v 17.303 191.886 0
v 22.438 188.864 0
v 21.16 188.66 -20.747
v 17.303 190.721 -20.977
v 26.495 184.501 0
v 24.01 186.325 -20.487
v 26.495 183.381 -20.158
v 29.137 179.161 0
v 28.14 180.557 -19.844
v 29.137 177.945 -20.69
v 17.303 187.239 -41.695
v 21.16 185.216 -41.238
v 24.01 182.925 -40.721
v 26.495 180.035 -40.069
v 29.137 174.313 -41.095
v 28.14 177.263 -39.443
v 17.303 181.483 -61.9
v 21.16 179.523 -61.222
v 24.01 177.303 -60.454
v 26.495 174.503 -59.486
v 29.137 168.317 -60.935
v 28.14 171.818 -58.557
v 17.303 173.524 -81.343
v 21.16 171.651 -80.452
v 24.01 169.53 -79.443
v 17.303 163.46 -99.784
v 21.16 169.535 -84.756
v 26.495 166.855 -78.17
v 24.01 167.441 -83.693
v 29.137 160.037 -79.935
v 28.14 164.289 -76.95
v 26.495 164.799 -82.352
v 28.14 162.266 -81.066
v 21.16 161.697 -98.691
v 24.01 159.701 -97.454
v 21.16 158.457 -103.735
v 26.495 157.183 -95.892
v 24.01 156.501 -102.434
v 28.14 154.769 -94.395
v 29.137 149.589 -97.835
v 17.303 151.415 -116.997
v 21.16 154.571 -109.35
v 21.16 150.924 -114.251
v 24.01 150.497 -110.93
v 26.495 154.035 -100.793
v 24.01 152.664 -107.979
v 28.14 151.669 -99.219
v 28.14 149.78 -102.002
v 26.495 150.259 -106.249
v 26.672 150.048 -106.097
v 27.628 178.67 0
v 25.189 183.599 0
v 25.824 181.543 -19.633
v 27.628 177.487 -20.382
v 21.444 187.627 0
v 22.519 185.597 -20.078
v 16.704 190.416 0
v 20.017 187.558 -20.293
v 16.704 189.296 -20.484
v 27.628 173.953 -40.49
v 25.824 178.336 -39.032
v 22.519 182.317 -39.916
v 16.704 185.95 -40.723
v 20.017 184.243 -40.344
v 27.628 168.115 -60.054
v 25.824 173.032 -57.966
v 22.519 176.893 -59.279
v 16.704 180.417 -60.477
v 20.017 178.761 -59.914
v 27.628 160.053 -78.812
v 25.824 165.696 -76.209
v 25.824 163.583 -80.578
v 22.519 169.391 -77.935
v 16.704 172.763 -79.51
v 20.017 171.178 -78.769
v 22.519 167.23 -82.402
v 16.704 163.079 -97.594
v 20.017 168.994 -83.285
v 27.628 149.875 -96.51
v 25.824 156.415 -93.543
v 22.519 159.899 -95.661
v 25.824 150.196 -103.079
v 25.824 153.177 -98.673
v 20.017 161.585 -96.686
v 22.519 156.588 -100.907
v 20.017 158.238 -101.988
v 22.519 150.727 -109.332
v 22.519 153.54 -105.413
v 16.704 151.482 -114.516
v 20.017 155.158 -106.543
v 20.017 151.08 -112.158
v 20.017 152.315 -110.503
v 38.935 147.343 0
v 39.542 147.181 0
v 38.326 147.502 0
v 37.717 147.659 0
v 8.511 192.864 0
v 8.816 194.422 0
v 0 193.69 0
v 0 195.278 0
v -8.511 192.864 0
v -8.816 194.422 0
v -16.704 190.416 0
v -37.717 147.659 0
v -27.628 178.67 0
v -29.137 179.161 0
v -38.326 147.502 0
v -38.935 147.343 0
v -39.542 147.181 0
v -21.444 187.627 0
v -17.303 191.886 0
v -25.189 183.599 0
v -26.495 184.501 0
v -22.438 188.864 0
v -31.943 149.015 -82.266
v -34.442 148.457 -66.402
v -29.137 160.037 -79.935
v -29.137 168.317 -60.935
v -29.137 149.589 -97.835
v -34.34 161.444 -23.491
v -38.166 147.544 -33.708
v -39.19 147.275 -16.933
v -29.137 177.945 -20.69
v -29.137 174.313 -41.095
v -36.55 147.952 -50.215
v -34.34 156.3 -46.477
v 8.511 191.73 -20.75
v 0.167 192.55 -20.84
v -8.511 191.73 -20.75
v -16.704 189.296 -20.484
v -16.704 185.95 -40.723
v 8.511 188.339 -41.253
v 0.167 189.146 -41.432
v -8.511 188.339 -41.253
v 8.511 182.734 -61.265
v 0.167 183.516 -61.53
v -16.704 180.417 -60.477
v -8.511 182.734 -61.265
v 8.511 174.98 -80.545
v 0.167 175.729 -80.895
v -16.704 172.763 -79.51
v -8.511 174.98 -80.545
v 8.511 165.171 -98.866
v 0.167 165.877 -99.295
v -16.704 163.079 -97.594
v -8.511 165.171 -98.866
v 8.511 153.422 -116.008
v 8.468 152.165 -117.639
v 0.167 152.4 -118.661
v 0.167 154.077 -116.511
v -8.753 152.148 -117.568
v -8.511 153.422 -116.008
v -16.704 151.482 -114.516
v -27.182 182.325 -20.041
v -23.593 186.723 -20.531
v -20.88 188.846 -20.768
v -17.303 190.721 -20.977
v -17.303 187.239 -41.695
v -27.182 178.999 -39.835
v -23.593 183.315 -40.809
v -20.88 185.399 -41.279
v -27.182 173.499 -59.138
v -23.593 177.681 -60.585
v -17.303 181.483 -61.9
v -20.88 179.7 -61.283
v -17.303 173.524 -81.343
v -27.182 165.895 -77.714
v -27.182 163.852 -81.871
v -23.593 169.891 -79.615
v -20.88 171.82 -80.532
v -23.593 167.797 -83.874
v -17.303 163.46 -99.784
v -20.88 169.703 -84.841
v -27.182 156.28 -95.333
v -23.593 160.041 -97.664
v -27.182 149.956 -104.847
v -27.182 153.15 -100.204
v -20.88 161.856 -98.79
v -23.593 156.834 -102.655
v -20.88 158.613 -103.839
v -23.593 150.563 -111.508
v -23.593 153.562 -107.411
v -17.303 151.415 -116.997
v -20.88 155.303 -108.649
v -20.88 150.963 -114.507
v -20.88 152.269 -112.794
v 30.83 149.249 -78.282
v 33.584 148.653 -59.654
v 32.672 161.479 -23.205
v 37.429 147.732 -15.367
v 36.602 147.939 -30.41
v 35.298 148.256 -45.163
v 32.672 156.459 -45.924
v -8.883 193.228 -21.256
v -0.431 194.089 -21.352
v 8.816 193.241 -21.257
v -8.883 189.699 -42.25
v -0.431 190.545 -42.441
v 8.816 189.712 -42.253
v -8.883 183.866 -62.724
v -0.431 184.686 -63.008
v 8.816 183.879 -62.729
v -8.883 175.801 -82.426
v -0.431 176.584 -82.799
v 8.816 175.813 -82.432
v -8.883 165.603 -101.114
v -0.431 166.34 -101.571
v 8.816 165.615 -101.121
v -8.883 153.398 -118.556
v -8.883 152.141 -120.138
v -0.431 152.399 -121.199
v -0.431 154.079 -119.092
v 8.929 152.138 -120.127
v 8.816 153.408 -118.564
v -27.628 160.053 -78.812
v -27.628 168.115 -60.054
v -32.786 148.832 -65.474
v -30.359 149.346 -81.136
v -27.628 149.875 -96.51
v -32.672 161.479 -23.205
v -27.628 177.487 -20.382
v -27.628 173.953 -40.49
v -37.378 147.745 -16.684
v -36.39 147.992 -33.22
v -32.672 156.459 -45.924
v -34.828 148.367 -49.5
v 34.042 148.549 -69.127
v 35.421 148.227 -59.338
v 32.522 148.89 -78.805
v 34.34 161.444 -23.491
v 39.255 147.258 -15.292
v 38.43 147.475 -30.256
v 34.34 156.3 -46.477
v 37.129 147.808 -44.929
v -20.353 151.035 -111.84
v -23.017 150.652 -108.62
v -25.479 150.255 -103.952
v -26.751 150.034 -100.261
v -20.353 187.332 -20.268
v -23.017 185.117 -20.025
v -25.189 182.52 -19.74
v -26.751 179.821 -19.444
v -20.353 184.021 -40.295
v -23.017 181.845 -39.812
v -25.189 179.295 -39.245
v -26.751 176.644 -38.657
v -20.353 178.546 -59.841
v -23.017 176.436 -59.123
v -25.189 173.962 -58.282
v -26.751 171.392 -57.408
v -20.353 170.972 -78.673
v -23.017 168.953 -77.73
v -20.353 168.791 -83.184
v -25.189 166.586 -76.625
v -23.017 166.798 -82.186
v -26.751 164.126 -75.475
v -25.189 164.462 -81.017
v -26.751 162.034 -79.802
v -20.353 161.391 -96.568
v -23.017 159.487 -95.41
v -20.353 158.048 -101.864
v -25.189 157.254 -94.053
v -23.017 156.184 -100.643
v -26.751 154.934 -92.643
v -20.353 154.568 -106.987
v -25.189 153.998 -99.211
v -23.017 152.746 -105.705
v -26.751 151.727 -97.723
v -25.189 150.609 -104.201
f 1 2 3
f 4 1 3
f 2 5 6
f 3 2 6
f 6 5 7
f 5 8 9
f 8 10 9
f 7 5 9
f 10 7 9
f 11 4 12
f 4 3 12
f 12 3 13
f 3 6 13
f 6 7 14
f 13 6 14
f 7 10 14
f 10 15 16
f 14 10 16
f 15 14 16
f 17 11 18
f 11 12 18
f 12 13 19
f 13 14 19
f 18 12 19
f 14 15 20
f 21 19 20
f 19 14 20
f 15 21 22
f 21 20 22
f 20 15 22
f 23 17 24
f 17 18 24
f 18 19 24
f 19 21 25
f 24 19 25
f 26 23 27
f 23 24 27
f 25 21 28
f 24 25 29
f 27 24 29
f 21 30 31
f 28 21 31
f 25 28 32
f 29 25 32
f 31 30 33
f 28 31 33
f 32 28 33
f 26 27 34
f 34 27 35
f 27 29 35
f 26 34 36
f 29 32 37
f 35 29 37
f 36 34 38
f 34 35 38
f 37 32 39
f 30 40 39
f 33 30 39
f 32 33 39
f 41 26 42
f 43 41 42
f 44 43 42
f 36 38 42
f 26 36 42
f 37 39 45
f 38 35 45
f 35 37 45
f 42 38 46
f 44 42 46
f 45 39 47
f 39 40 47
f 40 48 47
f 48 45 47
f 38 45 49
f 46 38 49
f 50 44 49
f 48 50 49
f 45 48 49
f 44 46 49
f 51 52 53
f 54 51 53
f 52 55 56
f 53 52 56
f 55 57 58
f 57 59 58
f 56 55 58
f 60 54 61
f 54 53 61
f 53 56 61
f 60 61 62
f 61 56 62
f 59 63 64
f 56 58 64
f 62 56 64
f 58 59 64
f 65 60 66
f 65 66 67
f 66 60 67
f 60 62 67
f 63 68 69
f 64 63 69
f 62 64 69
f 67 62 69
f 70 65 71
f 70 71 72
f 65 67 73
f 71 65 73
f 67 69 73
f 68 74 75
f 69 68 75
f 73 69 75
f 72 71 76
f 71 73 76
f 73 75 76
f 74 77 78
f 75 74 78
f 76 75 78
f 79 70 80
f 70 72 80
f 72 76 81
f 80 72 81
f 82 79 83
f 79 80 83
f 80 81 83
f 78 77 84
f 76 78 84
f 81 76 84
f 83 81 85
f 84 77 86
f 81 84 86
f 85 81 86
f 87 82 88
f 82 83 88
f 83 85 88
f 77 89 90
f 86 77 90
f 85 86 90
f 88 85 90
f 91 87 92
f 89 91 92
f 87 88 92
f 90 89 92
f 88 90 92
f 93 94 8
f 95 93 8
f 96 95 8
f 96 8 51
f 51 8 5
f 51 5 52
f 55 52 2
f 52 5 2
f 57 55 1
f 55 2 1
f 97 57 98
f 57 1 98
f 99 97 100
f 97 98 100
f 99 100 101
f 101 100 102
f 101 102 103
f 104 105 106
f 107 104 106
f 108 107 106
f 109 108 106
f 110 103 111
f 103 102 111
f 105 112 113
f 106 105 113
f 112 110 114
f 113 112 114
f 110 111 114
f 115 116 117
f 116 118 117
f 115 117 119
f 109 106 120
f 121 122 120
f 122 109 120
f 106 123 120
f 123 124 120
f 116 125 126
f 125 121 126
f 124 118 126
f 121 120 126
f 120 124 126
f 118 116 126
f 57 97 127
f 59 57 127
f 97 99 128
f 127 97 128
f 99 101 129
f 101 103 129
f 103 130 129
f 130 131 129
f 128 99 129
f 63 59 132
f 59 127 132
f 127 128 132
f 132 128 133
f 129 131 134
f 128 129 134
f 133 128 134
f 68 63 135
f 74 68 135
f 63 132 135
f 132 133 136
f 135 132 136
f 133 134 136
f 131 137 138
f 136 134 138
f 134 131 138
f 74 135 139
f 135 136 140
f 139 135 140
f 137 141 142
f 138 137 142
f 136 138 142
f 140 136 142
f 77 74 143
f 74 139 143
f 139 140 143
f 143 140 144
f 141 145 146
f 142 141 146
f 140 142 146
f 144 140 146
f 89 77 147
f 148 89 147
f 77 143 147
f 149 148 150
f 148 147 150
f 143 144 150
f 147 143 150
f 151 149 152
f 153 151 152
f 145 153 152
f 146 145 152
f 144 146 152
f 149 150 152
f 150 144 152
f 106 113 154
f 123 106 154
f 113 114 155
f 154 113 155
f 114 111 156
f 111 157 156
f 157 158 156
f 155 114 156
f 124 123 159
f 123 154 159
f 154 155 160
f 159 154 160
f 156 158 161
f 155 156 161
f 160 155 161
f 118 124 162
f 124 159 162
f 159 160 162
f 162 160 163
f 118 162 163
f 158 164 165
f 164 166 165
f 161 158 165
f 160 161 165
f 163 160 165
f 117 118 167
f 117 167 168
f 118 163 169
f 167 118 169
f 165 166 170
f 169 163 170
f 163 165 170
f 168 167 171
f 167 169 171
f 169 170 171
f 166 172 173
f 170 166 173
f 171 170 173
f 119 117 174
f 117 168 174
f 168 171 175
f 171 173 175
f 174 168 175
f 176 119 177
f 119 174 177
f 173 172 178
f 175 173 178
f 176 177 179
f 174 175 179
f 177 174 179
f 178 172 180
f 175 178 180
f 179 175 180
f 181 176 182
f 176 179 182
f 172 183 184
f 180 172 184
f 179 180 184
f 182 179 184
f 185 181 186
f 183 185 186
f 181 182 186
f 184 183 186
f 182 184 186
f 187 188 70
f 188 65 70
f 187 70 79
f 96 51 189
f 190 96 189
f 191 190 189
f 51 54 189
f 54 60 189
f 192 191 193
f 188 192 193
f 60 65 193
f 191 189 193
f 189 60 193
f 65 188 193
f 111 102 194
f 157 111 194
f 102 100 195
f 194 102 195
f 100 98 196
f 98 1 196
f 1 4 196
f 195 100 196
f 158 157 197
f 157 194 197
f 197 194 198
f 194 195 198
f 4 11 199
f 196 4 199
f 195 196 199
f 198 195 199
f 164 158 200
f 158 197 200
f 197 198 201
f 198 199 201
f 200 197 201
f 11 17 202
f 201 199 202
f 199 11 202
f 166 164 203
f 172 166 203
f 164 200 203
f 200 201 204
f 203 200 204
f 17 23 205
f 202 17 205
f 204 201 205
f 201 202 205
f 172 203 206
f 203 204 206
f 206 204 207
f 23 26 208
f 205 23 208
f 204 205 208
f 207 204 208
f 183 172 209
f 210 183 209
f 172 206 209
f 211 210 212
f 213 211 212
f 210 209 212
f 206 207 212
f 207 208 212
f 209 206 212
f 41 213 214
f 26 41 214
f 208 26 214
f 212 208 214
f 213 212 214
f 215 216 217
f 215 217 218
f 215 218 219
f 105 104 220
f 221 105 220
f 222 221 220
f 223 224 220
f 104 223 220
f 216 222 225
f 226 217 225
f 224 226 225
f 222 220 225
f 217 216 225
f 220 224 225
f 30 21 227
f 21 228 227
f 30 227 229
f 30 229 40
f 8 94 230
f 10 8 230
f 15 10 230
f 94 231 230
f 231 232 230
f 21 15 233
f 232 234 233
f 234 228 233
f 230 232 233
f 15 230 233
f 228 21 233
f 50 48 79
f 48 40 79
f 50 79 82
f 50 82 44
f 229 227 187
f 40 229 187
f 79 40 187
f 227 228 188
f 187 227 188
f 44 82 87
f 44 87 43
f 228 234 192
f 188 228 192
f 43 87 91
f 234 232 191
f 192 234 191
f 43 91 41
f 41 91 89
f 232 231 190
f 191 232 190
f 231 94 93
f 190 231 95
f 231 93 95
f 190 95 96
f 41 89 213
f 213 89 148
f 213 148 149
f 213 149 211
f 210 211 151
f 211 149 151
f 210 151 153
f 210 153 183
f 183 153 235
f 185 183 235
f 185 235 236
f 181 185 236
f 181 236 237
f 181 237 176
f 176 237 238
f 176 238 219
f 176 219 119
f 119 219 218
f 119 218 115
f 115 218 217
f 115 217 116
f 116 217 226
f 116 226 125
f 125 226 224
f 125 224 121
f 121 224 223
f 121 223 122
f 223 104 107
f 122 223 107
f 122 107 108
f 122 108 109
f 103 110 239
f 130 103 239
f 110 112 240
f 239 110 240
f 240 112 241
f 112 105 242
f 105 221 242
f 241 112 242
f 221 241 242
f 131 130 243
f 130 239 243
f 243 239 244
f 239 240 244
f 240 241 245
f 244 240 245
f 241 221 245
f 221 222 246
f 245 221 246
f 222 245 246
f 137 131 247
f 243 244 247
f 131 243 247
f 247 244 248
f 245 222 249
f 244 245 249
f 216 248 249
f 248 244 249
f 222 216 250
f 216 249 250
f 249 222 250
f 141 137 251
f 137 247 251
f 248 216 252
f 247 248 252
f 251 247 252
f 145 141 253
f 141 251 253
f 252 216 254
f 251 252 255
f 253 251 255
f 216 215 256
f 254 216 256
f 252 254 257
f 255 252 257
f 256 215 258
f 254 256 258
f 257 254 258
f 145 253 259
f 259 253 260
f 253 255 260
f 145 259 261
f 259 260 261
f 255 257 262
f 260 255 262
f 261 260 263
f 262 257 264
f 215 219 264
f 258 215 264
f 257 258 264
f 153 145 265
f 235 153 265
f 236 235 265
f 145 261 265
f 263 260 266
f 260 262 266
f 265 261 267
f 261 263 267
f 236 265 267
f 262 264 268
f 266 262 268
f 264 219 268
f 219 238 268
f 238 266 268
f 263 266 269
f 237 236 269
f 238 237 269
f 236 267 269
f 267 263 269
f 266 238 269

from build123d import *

# Parameters (mm, degrees)
REVOLVE1_ANGLE     = 56
SKETCH2_R          = 152.4
CUT_EXTRUDE1_DEPTH = 309.88


with BuildPart() as part:
    # Sketch1 → Revolve1 (revolve)
    with BuildSketch(Plane.XY):
        with BuildLine():
            Line((29.137194784, 179.160976849), (39.542245278, 147.180742077))
            ThreePointArc((39.542245278, 147.180742077), (38.630482432, 147.422677452), (37.717239544, 147.658964649))
            Line((37.717239544, 147.658964649), (27.627587493, 178.669812847))
            ThreePointArc((27.627587493, 178.669812847), (23.462294361, 185.748899875), (16.703713988, 190.41631151))
            ThreePointArc((16.703713988, 190.41631151), (0, 193.690277018), (-16.703713988, 190.41631151))
            ThreePointArc((-16.703713988, 190.41631151), (-23.462294361, 185.748899875), (-27.627587493, 178.669812847))
            Line((-27.627587493, 178.669812847), (-37.717239544, 147.658964649))
            ThreePointArc((-37.717239544, 147.658964649), (-38.630482432, 147.422677452), (-39.542245278, 147.180742077))
            Line((-39.542245278, 147.180742077), (-29.137194784, 179.160976849))
            ThreePointArc((-29.137194784, 179.160976849), (-24.624793891, 186.829987796), (-17.302998471, 191.886350359))
            ThreePointArc((-17.302998471, 191.886350359), (0, 195.277776974), (17.302998471, 191.886350359))
            ThreePointArc((17.302998471, 191.886350359), (24.624793891, 186.829987796), (29.137194784, 179.160976849))
        make_face()
    revolve(axis=Axis((0, 2.54, 0), (-1, 0, 0)), revolution_arc=REVOLVE1_ANGLE)

    # Sketch2 → Cut-Extrude1 (cut)
    with BuildSketch(Plane.XY):
        Circle(SKETCH2_R)
    extrude(amount=-CUT_EXTRUDE1_DEPTH, mode=Mode.SUBTRACT)


solid = part.part
